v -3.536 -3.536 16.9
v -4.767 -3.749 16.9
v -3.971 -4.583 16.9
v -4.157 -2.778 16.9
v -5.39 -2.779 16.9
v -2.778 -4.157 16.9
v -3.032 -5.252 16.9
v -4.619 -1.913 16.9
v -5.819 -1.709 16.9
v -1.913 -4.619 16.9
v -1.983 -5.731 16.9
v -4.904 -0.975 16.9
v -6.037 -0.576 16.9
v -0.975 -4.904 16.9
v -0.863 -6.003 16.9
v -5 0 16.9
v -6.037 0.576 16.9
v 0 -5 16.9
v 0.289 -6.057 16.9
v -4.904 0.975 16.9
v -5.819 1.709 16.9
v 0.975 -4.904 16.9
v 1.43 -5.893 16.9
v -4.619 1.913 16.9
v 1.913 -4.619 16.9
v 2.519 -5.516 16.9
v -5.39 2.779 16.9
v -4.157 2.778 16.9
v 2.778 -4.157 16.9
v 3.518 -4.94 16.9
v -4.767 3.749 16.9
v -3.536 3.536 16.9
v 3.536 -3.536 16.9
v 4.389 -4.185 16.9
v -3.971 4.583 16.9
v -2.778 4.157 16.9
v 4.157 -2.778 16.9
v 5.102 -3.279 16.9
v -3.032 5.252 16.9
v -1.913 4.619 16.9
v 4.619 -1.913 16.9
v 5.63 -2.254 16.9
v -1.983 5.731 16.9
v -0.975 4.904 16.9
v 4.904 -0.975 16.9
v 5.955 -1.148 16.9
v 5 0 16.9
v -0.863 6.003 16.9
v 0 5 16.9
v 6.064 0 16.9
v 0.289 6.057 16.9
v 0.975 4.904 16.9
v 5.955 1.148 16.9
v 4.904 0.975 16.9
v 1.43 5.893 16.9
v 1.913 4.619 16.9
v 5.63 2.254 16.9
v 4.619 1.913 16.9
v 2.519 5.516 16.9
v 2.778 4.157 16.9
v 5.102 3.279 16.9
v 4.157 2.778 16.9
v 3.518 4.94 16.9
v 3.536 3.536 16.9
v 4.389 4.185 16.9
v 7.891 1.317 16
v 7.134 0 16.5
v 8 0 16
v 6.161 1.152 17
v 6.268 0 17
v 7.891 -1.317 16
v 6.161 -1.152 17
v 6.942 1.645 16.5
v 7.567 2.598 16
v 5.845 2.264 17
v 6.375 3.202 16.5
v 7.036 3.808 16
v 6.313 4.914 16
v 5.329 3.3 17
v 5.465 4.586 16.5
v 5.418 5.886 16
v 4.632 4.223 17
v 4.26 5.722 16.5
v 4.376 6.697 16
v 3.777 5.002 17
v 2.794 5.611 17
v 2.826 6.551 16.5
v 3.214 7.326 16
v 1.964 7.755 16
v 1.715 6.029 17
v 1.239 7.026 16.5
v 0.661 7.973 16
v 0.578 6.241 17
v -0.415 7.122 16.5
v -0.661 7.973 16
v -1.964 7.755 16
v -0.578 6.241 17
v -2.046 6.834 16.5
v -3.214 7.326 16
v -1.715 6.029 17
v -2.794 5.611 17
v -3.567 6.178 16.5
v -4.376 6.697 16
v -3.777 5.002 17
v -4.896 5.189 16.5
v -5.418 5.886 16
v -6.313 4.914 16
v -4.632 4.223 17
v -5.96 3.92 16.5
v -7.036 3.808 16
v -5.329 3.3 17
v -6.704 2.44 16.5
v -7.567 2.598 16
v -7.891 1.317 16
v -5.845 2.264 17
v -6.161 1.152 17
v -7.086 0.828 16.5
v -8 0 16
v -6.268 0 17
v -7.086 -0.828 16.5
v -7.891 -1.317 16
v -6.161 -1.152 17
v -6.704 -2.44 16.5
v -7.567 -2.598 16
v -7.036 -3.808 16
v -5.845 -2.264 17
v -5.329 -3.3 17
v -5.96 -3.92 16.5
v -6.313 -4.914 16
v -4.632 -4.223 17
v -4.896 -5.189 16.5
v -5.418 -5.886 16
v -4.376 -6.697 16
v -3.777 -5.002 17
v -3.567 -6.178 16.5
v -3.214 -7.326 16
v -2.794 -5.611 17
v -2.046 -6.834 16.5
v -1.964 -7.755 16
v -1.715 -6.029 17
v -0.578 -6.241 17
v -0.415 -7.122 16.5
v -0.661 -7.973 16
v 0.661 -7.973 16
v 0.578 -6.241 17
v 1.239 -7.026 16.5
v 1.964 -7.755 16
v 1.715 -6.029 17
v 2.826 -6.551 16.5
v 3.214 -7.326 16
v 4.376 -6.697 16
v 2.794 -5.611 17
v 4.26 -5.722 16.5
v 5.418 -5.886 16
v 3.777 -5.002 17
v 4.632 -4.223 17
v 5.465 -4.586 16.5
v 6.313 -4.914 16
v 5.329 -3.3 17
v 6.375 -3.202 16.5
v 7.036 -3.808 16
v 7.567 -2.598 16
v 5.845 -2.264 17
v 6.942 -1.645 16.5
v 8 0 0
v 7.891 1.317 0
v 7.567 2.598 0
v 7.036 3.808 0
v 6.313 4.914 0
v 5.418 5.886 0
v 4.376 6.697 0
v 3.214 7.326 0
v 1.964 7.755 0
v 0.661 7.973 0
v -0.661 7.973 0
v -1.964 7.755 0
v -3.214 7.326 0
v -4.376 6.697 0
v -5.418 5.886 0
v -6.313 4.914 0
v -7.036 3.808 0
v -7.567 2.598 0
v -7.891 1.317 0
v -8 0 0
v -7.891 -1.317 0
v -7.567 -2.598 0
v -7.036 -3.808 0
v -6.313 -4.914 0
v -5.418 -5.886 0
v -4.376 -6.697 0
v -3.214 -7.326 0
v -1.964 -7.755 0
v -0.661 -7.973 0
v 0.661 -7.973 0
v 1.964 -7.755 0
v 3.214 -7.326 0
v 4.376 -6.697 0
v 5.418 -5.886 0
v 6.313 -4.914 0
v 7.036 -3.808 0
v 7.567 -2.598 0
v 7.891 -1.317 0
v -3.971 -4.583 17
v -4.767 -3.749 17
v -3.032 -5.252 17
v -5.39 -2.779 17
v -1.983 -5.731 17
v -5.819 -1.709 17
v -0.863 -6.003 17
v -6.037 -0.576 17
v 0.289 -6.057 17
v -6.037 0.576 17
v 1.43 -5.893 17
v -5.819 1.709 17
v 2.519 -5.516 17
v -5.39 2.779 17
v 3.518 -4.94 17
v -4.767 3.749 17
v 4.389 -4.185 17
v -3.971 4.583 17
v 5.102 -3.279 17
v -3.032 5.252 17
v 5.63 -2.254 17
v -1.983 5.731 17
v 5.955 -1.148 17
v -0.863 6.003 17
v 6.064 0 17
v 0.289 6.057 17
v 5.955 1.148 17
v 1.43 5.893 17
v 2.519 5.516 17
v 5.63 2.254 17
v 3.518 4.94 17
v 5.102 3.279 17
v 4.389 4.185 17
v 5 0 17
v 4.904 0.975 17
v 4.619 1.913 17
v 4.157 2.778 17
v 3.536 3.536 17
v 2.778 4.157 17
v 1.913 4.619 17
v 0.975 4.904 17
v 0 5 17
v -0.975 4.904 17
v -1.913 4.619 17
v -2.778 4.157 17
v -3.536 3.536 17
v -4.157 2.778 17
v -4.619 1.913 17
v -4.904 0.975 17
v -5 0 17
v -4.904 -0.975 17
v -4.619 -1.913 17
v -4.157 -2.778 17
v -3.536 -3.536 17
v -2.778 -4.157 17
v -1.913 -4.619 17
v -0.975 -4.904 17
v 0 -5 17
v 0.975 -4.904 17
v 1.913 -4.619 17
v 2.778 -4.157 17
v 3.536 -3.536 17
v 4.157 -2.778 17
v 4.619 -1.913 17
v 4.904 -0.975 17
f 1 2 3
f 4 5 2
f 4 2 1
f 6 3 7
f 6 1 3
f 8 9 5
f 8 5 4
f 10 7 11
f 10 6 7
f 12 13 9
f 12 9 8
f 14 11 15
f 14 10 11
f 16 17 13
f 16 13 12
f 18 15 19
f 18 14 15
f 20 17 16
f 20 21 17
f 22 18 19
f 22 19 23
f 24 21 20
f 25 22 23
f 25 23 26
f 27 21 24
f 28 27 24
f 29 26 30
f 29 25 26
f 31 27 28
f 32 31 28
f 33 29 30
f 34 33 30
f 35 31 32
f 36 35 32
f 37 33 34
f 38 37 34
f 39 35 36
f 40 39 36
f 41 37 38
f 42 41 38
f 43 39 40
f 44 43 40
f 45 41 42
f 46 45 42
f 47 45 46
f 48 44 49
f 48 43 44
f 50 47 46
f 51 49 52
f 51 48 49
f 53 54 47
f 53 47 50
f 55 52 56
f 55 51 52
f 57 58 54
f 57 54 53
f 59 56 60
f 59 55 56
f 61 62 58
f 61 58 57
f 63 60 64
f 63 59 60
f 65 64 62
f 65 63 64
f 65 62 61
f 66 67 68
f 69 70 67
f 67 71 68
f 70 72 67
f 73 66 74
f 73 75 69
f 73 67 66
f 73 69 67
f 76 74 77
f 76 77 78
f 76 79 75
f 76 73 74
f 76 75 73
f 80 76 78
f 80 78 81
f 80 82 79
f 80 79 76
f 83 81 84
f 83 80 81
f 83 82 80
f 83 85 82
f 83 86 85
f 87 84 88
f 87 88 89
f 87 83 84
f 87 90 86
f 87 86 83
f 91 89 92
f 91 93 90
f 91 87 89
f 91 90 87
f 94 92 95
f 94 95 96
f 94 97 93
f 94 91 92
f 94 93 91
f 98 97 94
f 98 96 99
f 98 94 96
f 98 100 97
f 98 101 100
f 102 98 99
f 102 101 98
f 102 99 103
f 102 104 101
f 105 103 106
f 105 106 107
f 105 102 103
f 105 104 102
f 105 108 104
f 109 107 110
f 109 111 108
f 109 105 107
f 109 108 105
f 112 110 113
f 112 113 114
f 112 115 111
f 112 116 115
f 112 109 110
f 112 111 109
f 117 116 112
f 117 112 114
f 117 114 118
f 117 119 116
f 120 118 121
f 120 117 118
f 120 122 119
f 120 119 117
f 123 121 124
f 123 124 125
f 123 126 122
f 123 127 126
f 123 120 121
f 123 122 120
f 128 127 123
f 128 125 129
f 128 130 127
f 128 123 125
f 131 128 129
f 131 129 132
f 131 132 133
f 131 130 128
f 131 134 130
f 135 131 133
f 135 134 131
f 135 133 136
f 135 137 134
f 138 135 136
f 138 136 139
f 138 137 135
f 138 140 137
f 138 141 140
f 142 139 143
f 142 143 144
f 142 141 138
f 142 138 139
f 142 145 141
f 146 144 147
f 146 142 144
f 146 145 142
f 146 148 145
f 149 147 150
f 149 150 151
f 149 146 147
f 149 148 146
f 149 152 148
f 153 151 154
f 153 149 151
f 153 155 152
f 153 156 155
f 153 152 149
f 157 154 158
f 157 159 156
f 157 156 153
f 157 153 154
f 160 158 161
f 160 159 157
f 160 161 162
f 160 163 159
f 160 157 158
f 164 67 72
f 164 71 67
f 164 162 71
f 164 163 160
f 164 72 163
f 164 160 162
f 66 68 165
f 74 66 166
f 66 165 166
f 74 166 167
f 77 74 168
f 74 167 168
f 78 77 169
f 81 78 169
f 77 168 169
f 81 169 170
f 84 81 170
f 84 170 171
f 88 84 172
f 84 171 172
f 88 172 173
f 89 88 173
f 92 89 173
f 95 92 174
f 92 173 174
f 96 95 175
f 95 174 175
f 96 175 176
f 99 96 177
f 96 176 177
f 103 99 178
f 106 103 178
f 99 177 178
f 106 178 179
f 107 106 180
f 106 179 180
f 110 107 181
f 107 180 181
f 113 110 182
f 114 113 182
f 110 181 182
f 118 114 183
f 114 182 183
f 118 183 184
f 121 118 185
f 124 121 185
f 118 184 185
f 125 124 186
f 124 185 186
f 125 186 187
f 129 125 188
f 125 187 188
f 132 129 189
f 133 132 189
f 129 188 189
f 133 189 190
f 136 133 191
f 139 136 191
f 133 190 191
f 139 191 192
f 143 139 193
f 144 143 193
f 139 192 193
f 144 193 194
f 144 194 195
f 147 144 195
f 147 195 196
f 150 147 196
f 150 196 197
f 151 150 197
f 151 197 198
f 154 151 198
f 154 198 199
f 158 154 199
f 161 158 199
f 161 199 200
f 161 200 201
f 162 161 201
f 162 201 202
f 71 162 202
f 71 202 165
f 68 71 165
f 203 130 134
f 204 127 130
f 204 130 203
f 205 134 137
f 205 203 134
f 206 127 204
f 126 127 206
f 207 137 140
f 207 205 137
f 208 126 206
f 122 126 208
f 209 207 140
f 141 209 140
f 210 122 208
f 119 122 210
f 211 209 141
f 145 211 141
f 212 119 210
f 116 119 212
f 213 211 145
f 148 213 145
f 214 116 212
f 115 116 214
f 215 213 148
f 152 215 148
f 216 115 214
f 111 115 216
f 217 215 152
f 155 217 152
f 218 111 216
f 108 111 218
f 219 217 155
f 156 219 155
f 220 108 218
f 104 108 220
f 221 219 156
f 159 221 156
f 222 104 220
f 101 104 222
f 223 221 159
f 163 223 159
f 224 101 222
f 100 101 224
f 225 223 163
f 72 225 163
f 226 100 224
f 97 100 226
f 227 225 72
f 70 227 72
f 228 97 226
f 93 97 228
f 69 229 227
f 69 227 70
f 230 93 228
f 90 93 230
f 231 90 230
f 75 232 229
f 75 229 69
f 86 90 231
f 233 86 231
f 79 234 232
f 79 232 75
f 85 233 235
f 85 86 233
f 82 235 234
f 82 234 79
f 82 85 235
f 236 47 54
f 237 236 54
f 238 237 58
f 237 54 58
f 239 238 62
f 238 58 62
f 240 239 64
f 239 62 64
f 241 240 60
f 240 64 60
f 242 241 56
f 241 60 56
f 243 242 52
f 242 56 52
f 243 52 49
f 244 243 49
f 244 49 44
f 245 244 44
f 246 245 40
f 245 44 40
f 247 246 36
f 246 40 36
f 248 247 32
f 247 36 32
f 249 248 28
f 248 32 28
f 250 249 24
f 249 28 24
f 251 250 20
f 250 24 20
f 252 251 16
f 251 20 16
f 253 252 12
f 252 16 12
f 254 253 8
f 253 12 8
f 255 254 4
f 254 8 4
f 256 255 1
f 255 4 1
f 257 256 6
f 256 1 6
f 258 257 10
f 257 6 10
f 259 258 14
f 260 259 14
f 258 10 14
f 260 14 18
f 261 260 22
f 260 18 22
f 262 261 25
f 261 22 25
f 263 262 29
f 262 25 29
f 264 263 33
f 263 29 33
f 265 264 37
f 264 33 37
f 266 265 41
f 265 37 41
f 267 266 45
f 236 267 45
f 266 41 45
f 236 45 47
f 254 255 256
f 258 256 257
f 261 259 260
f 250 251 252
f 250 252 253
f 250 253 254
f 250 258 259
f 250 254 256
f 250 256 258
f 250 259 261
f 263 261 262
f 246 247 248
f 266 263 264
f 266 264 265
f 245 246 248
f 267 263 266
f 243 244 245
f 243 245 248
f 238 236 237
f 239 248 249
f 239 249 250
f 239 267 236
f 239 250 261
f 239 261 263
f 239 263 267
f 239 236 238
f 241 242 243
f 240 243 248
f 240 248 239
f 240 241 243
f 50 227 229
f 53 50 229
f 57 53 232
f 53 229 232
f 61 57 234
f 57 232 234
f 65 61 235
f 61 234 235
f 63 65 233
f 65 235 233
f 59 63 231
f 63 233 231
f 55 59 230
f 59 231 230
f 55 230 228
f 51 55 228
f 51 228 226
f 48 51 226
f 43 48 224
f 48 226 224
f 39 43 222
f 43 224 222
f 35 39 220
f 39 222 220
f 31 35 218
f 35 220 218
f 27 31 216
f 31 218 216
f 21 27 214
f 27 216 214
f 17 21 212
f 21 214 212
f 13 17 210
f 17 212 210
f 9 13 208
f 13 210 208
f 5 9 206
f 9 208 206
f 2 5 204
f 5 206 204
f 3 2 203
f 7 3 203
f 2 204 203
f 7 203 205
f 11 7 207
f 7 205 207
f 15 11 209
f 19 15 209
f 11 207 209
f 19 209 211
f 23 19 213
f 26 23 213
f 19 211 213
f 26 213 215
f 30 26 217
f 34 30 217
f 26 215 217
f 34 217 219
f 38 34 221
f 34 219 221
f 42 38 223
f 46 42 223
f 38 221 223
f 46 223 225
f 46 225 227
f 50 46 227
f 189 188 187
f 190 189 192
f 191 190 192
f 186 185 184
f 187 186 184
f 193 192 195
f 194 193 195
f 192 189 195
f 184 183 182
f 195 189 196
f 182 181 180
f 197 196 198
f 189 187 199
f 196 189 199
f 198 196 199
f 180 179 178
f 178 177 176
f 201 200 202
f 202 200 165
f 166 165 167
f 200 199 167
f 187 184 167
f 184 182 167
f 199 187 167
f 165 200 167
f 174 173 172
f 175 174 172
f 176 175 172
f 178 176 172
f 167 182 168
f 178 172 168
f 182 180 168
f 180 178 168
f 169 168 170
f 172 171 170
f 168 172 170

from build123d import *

# Parameters (mm, degrees)
SKETCH2_R           = 8
BOSS_EXTRUDE1_DEPTH = 17
CHAMFER1_SIZE       = 1
CHAMFER1_SIZE2      = 1.732050808
SKETCH5_R           = 6.064278786
CUT_EXTRUDE1_DEPTH  = 0.1
SKETCH6_R           = 5
BOSS_EXTRUDE4_DEPTH = 0.1


with BuildPart() as part:
    # Sketch2 → Boss-Extrude1 (new body)
    with BuildSketch(Plane.XY):
        Circle(SKETCH2_R)
    extrude(amount=BOSS_EXTRUDE1_DEPTH)

    # Chamfer1
    chamfer1_edges = [part.edges().sort_by_distance(p)[0] for p in [
        (-8, 0, 17),
    ]]
    chamfer1_side = [part.faces().sort_by_distance(p)[0] for p in [
        (-8, 0, 8.5),
    ]]
    chamfer(chamfer1_edges, length=CHAMFER1_SIZE, length2=CHAMFER1_SIZE2, reference=chamfer1_side[0])

    # Sketch5 → Cut-Extrude1 (cut)
    with BuildSketch(Plane.XY.offset(17)):
        Circle(SKETCH5_R)
    extrude(amount=-CUT_EXTRUDE1_DEPTH, mode=Mode.SUBTRACT)

    # Sketch6 → Boss-Extrude4 (add)
    with BuildSketch(Plane.XY.offset(16.9)):
        Circle(SKETCH6_R)
    extrude(amount=BOSS_EXTRUDE4_DEPTH)


solid = part.part
